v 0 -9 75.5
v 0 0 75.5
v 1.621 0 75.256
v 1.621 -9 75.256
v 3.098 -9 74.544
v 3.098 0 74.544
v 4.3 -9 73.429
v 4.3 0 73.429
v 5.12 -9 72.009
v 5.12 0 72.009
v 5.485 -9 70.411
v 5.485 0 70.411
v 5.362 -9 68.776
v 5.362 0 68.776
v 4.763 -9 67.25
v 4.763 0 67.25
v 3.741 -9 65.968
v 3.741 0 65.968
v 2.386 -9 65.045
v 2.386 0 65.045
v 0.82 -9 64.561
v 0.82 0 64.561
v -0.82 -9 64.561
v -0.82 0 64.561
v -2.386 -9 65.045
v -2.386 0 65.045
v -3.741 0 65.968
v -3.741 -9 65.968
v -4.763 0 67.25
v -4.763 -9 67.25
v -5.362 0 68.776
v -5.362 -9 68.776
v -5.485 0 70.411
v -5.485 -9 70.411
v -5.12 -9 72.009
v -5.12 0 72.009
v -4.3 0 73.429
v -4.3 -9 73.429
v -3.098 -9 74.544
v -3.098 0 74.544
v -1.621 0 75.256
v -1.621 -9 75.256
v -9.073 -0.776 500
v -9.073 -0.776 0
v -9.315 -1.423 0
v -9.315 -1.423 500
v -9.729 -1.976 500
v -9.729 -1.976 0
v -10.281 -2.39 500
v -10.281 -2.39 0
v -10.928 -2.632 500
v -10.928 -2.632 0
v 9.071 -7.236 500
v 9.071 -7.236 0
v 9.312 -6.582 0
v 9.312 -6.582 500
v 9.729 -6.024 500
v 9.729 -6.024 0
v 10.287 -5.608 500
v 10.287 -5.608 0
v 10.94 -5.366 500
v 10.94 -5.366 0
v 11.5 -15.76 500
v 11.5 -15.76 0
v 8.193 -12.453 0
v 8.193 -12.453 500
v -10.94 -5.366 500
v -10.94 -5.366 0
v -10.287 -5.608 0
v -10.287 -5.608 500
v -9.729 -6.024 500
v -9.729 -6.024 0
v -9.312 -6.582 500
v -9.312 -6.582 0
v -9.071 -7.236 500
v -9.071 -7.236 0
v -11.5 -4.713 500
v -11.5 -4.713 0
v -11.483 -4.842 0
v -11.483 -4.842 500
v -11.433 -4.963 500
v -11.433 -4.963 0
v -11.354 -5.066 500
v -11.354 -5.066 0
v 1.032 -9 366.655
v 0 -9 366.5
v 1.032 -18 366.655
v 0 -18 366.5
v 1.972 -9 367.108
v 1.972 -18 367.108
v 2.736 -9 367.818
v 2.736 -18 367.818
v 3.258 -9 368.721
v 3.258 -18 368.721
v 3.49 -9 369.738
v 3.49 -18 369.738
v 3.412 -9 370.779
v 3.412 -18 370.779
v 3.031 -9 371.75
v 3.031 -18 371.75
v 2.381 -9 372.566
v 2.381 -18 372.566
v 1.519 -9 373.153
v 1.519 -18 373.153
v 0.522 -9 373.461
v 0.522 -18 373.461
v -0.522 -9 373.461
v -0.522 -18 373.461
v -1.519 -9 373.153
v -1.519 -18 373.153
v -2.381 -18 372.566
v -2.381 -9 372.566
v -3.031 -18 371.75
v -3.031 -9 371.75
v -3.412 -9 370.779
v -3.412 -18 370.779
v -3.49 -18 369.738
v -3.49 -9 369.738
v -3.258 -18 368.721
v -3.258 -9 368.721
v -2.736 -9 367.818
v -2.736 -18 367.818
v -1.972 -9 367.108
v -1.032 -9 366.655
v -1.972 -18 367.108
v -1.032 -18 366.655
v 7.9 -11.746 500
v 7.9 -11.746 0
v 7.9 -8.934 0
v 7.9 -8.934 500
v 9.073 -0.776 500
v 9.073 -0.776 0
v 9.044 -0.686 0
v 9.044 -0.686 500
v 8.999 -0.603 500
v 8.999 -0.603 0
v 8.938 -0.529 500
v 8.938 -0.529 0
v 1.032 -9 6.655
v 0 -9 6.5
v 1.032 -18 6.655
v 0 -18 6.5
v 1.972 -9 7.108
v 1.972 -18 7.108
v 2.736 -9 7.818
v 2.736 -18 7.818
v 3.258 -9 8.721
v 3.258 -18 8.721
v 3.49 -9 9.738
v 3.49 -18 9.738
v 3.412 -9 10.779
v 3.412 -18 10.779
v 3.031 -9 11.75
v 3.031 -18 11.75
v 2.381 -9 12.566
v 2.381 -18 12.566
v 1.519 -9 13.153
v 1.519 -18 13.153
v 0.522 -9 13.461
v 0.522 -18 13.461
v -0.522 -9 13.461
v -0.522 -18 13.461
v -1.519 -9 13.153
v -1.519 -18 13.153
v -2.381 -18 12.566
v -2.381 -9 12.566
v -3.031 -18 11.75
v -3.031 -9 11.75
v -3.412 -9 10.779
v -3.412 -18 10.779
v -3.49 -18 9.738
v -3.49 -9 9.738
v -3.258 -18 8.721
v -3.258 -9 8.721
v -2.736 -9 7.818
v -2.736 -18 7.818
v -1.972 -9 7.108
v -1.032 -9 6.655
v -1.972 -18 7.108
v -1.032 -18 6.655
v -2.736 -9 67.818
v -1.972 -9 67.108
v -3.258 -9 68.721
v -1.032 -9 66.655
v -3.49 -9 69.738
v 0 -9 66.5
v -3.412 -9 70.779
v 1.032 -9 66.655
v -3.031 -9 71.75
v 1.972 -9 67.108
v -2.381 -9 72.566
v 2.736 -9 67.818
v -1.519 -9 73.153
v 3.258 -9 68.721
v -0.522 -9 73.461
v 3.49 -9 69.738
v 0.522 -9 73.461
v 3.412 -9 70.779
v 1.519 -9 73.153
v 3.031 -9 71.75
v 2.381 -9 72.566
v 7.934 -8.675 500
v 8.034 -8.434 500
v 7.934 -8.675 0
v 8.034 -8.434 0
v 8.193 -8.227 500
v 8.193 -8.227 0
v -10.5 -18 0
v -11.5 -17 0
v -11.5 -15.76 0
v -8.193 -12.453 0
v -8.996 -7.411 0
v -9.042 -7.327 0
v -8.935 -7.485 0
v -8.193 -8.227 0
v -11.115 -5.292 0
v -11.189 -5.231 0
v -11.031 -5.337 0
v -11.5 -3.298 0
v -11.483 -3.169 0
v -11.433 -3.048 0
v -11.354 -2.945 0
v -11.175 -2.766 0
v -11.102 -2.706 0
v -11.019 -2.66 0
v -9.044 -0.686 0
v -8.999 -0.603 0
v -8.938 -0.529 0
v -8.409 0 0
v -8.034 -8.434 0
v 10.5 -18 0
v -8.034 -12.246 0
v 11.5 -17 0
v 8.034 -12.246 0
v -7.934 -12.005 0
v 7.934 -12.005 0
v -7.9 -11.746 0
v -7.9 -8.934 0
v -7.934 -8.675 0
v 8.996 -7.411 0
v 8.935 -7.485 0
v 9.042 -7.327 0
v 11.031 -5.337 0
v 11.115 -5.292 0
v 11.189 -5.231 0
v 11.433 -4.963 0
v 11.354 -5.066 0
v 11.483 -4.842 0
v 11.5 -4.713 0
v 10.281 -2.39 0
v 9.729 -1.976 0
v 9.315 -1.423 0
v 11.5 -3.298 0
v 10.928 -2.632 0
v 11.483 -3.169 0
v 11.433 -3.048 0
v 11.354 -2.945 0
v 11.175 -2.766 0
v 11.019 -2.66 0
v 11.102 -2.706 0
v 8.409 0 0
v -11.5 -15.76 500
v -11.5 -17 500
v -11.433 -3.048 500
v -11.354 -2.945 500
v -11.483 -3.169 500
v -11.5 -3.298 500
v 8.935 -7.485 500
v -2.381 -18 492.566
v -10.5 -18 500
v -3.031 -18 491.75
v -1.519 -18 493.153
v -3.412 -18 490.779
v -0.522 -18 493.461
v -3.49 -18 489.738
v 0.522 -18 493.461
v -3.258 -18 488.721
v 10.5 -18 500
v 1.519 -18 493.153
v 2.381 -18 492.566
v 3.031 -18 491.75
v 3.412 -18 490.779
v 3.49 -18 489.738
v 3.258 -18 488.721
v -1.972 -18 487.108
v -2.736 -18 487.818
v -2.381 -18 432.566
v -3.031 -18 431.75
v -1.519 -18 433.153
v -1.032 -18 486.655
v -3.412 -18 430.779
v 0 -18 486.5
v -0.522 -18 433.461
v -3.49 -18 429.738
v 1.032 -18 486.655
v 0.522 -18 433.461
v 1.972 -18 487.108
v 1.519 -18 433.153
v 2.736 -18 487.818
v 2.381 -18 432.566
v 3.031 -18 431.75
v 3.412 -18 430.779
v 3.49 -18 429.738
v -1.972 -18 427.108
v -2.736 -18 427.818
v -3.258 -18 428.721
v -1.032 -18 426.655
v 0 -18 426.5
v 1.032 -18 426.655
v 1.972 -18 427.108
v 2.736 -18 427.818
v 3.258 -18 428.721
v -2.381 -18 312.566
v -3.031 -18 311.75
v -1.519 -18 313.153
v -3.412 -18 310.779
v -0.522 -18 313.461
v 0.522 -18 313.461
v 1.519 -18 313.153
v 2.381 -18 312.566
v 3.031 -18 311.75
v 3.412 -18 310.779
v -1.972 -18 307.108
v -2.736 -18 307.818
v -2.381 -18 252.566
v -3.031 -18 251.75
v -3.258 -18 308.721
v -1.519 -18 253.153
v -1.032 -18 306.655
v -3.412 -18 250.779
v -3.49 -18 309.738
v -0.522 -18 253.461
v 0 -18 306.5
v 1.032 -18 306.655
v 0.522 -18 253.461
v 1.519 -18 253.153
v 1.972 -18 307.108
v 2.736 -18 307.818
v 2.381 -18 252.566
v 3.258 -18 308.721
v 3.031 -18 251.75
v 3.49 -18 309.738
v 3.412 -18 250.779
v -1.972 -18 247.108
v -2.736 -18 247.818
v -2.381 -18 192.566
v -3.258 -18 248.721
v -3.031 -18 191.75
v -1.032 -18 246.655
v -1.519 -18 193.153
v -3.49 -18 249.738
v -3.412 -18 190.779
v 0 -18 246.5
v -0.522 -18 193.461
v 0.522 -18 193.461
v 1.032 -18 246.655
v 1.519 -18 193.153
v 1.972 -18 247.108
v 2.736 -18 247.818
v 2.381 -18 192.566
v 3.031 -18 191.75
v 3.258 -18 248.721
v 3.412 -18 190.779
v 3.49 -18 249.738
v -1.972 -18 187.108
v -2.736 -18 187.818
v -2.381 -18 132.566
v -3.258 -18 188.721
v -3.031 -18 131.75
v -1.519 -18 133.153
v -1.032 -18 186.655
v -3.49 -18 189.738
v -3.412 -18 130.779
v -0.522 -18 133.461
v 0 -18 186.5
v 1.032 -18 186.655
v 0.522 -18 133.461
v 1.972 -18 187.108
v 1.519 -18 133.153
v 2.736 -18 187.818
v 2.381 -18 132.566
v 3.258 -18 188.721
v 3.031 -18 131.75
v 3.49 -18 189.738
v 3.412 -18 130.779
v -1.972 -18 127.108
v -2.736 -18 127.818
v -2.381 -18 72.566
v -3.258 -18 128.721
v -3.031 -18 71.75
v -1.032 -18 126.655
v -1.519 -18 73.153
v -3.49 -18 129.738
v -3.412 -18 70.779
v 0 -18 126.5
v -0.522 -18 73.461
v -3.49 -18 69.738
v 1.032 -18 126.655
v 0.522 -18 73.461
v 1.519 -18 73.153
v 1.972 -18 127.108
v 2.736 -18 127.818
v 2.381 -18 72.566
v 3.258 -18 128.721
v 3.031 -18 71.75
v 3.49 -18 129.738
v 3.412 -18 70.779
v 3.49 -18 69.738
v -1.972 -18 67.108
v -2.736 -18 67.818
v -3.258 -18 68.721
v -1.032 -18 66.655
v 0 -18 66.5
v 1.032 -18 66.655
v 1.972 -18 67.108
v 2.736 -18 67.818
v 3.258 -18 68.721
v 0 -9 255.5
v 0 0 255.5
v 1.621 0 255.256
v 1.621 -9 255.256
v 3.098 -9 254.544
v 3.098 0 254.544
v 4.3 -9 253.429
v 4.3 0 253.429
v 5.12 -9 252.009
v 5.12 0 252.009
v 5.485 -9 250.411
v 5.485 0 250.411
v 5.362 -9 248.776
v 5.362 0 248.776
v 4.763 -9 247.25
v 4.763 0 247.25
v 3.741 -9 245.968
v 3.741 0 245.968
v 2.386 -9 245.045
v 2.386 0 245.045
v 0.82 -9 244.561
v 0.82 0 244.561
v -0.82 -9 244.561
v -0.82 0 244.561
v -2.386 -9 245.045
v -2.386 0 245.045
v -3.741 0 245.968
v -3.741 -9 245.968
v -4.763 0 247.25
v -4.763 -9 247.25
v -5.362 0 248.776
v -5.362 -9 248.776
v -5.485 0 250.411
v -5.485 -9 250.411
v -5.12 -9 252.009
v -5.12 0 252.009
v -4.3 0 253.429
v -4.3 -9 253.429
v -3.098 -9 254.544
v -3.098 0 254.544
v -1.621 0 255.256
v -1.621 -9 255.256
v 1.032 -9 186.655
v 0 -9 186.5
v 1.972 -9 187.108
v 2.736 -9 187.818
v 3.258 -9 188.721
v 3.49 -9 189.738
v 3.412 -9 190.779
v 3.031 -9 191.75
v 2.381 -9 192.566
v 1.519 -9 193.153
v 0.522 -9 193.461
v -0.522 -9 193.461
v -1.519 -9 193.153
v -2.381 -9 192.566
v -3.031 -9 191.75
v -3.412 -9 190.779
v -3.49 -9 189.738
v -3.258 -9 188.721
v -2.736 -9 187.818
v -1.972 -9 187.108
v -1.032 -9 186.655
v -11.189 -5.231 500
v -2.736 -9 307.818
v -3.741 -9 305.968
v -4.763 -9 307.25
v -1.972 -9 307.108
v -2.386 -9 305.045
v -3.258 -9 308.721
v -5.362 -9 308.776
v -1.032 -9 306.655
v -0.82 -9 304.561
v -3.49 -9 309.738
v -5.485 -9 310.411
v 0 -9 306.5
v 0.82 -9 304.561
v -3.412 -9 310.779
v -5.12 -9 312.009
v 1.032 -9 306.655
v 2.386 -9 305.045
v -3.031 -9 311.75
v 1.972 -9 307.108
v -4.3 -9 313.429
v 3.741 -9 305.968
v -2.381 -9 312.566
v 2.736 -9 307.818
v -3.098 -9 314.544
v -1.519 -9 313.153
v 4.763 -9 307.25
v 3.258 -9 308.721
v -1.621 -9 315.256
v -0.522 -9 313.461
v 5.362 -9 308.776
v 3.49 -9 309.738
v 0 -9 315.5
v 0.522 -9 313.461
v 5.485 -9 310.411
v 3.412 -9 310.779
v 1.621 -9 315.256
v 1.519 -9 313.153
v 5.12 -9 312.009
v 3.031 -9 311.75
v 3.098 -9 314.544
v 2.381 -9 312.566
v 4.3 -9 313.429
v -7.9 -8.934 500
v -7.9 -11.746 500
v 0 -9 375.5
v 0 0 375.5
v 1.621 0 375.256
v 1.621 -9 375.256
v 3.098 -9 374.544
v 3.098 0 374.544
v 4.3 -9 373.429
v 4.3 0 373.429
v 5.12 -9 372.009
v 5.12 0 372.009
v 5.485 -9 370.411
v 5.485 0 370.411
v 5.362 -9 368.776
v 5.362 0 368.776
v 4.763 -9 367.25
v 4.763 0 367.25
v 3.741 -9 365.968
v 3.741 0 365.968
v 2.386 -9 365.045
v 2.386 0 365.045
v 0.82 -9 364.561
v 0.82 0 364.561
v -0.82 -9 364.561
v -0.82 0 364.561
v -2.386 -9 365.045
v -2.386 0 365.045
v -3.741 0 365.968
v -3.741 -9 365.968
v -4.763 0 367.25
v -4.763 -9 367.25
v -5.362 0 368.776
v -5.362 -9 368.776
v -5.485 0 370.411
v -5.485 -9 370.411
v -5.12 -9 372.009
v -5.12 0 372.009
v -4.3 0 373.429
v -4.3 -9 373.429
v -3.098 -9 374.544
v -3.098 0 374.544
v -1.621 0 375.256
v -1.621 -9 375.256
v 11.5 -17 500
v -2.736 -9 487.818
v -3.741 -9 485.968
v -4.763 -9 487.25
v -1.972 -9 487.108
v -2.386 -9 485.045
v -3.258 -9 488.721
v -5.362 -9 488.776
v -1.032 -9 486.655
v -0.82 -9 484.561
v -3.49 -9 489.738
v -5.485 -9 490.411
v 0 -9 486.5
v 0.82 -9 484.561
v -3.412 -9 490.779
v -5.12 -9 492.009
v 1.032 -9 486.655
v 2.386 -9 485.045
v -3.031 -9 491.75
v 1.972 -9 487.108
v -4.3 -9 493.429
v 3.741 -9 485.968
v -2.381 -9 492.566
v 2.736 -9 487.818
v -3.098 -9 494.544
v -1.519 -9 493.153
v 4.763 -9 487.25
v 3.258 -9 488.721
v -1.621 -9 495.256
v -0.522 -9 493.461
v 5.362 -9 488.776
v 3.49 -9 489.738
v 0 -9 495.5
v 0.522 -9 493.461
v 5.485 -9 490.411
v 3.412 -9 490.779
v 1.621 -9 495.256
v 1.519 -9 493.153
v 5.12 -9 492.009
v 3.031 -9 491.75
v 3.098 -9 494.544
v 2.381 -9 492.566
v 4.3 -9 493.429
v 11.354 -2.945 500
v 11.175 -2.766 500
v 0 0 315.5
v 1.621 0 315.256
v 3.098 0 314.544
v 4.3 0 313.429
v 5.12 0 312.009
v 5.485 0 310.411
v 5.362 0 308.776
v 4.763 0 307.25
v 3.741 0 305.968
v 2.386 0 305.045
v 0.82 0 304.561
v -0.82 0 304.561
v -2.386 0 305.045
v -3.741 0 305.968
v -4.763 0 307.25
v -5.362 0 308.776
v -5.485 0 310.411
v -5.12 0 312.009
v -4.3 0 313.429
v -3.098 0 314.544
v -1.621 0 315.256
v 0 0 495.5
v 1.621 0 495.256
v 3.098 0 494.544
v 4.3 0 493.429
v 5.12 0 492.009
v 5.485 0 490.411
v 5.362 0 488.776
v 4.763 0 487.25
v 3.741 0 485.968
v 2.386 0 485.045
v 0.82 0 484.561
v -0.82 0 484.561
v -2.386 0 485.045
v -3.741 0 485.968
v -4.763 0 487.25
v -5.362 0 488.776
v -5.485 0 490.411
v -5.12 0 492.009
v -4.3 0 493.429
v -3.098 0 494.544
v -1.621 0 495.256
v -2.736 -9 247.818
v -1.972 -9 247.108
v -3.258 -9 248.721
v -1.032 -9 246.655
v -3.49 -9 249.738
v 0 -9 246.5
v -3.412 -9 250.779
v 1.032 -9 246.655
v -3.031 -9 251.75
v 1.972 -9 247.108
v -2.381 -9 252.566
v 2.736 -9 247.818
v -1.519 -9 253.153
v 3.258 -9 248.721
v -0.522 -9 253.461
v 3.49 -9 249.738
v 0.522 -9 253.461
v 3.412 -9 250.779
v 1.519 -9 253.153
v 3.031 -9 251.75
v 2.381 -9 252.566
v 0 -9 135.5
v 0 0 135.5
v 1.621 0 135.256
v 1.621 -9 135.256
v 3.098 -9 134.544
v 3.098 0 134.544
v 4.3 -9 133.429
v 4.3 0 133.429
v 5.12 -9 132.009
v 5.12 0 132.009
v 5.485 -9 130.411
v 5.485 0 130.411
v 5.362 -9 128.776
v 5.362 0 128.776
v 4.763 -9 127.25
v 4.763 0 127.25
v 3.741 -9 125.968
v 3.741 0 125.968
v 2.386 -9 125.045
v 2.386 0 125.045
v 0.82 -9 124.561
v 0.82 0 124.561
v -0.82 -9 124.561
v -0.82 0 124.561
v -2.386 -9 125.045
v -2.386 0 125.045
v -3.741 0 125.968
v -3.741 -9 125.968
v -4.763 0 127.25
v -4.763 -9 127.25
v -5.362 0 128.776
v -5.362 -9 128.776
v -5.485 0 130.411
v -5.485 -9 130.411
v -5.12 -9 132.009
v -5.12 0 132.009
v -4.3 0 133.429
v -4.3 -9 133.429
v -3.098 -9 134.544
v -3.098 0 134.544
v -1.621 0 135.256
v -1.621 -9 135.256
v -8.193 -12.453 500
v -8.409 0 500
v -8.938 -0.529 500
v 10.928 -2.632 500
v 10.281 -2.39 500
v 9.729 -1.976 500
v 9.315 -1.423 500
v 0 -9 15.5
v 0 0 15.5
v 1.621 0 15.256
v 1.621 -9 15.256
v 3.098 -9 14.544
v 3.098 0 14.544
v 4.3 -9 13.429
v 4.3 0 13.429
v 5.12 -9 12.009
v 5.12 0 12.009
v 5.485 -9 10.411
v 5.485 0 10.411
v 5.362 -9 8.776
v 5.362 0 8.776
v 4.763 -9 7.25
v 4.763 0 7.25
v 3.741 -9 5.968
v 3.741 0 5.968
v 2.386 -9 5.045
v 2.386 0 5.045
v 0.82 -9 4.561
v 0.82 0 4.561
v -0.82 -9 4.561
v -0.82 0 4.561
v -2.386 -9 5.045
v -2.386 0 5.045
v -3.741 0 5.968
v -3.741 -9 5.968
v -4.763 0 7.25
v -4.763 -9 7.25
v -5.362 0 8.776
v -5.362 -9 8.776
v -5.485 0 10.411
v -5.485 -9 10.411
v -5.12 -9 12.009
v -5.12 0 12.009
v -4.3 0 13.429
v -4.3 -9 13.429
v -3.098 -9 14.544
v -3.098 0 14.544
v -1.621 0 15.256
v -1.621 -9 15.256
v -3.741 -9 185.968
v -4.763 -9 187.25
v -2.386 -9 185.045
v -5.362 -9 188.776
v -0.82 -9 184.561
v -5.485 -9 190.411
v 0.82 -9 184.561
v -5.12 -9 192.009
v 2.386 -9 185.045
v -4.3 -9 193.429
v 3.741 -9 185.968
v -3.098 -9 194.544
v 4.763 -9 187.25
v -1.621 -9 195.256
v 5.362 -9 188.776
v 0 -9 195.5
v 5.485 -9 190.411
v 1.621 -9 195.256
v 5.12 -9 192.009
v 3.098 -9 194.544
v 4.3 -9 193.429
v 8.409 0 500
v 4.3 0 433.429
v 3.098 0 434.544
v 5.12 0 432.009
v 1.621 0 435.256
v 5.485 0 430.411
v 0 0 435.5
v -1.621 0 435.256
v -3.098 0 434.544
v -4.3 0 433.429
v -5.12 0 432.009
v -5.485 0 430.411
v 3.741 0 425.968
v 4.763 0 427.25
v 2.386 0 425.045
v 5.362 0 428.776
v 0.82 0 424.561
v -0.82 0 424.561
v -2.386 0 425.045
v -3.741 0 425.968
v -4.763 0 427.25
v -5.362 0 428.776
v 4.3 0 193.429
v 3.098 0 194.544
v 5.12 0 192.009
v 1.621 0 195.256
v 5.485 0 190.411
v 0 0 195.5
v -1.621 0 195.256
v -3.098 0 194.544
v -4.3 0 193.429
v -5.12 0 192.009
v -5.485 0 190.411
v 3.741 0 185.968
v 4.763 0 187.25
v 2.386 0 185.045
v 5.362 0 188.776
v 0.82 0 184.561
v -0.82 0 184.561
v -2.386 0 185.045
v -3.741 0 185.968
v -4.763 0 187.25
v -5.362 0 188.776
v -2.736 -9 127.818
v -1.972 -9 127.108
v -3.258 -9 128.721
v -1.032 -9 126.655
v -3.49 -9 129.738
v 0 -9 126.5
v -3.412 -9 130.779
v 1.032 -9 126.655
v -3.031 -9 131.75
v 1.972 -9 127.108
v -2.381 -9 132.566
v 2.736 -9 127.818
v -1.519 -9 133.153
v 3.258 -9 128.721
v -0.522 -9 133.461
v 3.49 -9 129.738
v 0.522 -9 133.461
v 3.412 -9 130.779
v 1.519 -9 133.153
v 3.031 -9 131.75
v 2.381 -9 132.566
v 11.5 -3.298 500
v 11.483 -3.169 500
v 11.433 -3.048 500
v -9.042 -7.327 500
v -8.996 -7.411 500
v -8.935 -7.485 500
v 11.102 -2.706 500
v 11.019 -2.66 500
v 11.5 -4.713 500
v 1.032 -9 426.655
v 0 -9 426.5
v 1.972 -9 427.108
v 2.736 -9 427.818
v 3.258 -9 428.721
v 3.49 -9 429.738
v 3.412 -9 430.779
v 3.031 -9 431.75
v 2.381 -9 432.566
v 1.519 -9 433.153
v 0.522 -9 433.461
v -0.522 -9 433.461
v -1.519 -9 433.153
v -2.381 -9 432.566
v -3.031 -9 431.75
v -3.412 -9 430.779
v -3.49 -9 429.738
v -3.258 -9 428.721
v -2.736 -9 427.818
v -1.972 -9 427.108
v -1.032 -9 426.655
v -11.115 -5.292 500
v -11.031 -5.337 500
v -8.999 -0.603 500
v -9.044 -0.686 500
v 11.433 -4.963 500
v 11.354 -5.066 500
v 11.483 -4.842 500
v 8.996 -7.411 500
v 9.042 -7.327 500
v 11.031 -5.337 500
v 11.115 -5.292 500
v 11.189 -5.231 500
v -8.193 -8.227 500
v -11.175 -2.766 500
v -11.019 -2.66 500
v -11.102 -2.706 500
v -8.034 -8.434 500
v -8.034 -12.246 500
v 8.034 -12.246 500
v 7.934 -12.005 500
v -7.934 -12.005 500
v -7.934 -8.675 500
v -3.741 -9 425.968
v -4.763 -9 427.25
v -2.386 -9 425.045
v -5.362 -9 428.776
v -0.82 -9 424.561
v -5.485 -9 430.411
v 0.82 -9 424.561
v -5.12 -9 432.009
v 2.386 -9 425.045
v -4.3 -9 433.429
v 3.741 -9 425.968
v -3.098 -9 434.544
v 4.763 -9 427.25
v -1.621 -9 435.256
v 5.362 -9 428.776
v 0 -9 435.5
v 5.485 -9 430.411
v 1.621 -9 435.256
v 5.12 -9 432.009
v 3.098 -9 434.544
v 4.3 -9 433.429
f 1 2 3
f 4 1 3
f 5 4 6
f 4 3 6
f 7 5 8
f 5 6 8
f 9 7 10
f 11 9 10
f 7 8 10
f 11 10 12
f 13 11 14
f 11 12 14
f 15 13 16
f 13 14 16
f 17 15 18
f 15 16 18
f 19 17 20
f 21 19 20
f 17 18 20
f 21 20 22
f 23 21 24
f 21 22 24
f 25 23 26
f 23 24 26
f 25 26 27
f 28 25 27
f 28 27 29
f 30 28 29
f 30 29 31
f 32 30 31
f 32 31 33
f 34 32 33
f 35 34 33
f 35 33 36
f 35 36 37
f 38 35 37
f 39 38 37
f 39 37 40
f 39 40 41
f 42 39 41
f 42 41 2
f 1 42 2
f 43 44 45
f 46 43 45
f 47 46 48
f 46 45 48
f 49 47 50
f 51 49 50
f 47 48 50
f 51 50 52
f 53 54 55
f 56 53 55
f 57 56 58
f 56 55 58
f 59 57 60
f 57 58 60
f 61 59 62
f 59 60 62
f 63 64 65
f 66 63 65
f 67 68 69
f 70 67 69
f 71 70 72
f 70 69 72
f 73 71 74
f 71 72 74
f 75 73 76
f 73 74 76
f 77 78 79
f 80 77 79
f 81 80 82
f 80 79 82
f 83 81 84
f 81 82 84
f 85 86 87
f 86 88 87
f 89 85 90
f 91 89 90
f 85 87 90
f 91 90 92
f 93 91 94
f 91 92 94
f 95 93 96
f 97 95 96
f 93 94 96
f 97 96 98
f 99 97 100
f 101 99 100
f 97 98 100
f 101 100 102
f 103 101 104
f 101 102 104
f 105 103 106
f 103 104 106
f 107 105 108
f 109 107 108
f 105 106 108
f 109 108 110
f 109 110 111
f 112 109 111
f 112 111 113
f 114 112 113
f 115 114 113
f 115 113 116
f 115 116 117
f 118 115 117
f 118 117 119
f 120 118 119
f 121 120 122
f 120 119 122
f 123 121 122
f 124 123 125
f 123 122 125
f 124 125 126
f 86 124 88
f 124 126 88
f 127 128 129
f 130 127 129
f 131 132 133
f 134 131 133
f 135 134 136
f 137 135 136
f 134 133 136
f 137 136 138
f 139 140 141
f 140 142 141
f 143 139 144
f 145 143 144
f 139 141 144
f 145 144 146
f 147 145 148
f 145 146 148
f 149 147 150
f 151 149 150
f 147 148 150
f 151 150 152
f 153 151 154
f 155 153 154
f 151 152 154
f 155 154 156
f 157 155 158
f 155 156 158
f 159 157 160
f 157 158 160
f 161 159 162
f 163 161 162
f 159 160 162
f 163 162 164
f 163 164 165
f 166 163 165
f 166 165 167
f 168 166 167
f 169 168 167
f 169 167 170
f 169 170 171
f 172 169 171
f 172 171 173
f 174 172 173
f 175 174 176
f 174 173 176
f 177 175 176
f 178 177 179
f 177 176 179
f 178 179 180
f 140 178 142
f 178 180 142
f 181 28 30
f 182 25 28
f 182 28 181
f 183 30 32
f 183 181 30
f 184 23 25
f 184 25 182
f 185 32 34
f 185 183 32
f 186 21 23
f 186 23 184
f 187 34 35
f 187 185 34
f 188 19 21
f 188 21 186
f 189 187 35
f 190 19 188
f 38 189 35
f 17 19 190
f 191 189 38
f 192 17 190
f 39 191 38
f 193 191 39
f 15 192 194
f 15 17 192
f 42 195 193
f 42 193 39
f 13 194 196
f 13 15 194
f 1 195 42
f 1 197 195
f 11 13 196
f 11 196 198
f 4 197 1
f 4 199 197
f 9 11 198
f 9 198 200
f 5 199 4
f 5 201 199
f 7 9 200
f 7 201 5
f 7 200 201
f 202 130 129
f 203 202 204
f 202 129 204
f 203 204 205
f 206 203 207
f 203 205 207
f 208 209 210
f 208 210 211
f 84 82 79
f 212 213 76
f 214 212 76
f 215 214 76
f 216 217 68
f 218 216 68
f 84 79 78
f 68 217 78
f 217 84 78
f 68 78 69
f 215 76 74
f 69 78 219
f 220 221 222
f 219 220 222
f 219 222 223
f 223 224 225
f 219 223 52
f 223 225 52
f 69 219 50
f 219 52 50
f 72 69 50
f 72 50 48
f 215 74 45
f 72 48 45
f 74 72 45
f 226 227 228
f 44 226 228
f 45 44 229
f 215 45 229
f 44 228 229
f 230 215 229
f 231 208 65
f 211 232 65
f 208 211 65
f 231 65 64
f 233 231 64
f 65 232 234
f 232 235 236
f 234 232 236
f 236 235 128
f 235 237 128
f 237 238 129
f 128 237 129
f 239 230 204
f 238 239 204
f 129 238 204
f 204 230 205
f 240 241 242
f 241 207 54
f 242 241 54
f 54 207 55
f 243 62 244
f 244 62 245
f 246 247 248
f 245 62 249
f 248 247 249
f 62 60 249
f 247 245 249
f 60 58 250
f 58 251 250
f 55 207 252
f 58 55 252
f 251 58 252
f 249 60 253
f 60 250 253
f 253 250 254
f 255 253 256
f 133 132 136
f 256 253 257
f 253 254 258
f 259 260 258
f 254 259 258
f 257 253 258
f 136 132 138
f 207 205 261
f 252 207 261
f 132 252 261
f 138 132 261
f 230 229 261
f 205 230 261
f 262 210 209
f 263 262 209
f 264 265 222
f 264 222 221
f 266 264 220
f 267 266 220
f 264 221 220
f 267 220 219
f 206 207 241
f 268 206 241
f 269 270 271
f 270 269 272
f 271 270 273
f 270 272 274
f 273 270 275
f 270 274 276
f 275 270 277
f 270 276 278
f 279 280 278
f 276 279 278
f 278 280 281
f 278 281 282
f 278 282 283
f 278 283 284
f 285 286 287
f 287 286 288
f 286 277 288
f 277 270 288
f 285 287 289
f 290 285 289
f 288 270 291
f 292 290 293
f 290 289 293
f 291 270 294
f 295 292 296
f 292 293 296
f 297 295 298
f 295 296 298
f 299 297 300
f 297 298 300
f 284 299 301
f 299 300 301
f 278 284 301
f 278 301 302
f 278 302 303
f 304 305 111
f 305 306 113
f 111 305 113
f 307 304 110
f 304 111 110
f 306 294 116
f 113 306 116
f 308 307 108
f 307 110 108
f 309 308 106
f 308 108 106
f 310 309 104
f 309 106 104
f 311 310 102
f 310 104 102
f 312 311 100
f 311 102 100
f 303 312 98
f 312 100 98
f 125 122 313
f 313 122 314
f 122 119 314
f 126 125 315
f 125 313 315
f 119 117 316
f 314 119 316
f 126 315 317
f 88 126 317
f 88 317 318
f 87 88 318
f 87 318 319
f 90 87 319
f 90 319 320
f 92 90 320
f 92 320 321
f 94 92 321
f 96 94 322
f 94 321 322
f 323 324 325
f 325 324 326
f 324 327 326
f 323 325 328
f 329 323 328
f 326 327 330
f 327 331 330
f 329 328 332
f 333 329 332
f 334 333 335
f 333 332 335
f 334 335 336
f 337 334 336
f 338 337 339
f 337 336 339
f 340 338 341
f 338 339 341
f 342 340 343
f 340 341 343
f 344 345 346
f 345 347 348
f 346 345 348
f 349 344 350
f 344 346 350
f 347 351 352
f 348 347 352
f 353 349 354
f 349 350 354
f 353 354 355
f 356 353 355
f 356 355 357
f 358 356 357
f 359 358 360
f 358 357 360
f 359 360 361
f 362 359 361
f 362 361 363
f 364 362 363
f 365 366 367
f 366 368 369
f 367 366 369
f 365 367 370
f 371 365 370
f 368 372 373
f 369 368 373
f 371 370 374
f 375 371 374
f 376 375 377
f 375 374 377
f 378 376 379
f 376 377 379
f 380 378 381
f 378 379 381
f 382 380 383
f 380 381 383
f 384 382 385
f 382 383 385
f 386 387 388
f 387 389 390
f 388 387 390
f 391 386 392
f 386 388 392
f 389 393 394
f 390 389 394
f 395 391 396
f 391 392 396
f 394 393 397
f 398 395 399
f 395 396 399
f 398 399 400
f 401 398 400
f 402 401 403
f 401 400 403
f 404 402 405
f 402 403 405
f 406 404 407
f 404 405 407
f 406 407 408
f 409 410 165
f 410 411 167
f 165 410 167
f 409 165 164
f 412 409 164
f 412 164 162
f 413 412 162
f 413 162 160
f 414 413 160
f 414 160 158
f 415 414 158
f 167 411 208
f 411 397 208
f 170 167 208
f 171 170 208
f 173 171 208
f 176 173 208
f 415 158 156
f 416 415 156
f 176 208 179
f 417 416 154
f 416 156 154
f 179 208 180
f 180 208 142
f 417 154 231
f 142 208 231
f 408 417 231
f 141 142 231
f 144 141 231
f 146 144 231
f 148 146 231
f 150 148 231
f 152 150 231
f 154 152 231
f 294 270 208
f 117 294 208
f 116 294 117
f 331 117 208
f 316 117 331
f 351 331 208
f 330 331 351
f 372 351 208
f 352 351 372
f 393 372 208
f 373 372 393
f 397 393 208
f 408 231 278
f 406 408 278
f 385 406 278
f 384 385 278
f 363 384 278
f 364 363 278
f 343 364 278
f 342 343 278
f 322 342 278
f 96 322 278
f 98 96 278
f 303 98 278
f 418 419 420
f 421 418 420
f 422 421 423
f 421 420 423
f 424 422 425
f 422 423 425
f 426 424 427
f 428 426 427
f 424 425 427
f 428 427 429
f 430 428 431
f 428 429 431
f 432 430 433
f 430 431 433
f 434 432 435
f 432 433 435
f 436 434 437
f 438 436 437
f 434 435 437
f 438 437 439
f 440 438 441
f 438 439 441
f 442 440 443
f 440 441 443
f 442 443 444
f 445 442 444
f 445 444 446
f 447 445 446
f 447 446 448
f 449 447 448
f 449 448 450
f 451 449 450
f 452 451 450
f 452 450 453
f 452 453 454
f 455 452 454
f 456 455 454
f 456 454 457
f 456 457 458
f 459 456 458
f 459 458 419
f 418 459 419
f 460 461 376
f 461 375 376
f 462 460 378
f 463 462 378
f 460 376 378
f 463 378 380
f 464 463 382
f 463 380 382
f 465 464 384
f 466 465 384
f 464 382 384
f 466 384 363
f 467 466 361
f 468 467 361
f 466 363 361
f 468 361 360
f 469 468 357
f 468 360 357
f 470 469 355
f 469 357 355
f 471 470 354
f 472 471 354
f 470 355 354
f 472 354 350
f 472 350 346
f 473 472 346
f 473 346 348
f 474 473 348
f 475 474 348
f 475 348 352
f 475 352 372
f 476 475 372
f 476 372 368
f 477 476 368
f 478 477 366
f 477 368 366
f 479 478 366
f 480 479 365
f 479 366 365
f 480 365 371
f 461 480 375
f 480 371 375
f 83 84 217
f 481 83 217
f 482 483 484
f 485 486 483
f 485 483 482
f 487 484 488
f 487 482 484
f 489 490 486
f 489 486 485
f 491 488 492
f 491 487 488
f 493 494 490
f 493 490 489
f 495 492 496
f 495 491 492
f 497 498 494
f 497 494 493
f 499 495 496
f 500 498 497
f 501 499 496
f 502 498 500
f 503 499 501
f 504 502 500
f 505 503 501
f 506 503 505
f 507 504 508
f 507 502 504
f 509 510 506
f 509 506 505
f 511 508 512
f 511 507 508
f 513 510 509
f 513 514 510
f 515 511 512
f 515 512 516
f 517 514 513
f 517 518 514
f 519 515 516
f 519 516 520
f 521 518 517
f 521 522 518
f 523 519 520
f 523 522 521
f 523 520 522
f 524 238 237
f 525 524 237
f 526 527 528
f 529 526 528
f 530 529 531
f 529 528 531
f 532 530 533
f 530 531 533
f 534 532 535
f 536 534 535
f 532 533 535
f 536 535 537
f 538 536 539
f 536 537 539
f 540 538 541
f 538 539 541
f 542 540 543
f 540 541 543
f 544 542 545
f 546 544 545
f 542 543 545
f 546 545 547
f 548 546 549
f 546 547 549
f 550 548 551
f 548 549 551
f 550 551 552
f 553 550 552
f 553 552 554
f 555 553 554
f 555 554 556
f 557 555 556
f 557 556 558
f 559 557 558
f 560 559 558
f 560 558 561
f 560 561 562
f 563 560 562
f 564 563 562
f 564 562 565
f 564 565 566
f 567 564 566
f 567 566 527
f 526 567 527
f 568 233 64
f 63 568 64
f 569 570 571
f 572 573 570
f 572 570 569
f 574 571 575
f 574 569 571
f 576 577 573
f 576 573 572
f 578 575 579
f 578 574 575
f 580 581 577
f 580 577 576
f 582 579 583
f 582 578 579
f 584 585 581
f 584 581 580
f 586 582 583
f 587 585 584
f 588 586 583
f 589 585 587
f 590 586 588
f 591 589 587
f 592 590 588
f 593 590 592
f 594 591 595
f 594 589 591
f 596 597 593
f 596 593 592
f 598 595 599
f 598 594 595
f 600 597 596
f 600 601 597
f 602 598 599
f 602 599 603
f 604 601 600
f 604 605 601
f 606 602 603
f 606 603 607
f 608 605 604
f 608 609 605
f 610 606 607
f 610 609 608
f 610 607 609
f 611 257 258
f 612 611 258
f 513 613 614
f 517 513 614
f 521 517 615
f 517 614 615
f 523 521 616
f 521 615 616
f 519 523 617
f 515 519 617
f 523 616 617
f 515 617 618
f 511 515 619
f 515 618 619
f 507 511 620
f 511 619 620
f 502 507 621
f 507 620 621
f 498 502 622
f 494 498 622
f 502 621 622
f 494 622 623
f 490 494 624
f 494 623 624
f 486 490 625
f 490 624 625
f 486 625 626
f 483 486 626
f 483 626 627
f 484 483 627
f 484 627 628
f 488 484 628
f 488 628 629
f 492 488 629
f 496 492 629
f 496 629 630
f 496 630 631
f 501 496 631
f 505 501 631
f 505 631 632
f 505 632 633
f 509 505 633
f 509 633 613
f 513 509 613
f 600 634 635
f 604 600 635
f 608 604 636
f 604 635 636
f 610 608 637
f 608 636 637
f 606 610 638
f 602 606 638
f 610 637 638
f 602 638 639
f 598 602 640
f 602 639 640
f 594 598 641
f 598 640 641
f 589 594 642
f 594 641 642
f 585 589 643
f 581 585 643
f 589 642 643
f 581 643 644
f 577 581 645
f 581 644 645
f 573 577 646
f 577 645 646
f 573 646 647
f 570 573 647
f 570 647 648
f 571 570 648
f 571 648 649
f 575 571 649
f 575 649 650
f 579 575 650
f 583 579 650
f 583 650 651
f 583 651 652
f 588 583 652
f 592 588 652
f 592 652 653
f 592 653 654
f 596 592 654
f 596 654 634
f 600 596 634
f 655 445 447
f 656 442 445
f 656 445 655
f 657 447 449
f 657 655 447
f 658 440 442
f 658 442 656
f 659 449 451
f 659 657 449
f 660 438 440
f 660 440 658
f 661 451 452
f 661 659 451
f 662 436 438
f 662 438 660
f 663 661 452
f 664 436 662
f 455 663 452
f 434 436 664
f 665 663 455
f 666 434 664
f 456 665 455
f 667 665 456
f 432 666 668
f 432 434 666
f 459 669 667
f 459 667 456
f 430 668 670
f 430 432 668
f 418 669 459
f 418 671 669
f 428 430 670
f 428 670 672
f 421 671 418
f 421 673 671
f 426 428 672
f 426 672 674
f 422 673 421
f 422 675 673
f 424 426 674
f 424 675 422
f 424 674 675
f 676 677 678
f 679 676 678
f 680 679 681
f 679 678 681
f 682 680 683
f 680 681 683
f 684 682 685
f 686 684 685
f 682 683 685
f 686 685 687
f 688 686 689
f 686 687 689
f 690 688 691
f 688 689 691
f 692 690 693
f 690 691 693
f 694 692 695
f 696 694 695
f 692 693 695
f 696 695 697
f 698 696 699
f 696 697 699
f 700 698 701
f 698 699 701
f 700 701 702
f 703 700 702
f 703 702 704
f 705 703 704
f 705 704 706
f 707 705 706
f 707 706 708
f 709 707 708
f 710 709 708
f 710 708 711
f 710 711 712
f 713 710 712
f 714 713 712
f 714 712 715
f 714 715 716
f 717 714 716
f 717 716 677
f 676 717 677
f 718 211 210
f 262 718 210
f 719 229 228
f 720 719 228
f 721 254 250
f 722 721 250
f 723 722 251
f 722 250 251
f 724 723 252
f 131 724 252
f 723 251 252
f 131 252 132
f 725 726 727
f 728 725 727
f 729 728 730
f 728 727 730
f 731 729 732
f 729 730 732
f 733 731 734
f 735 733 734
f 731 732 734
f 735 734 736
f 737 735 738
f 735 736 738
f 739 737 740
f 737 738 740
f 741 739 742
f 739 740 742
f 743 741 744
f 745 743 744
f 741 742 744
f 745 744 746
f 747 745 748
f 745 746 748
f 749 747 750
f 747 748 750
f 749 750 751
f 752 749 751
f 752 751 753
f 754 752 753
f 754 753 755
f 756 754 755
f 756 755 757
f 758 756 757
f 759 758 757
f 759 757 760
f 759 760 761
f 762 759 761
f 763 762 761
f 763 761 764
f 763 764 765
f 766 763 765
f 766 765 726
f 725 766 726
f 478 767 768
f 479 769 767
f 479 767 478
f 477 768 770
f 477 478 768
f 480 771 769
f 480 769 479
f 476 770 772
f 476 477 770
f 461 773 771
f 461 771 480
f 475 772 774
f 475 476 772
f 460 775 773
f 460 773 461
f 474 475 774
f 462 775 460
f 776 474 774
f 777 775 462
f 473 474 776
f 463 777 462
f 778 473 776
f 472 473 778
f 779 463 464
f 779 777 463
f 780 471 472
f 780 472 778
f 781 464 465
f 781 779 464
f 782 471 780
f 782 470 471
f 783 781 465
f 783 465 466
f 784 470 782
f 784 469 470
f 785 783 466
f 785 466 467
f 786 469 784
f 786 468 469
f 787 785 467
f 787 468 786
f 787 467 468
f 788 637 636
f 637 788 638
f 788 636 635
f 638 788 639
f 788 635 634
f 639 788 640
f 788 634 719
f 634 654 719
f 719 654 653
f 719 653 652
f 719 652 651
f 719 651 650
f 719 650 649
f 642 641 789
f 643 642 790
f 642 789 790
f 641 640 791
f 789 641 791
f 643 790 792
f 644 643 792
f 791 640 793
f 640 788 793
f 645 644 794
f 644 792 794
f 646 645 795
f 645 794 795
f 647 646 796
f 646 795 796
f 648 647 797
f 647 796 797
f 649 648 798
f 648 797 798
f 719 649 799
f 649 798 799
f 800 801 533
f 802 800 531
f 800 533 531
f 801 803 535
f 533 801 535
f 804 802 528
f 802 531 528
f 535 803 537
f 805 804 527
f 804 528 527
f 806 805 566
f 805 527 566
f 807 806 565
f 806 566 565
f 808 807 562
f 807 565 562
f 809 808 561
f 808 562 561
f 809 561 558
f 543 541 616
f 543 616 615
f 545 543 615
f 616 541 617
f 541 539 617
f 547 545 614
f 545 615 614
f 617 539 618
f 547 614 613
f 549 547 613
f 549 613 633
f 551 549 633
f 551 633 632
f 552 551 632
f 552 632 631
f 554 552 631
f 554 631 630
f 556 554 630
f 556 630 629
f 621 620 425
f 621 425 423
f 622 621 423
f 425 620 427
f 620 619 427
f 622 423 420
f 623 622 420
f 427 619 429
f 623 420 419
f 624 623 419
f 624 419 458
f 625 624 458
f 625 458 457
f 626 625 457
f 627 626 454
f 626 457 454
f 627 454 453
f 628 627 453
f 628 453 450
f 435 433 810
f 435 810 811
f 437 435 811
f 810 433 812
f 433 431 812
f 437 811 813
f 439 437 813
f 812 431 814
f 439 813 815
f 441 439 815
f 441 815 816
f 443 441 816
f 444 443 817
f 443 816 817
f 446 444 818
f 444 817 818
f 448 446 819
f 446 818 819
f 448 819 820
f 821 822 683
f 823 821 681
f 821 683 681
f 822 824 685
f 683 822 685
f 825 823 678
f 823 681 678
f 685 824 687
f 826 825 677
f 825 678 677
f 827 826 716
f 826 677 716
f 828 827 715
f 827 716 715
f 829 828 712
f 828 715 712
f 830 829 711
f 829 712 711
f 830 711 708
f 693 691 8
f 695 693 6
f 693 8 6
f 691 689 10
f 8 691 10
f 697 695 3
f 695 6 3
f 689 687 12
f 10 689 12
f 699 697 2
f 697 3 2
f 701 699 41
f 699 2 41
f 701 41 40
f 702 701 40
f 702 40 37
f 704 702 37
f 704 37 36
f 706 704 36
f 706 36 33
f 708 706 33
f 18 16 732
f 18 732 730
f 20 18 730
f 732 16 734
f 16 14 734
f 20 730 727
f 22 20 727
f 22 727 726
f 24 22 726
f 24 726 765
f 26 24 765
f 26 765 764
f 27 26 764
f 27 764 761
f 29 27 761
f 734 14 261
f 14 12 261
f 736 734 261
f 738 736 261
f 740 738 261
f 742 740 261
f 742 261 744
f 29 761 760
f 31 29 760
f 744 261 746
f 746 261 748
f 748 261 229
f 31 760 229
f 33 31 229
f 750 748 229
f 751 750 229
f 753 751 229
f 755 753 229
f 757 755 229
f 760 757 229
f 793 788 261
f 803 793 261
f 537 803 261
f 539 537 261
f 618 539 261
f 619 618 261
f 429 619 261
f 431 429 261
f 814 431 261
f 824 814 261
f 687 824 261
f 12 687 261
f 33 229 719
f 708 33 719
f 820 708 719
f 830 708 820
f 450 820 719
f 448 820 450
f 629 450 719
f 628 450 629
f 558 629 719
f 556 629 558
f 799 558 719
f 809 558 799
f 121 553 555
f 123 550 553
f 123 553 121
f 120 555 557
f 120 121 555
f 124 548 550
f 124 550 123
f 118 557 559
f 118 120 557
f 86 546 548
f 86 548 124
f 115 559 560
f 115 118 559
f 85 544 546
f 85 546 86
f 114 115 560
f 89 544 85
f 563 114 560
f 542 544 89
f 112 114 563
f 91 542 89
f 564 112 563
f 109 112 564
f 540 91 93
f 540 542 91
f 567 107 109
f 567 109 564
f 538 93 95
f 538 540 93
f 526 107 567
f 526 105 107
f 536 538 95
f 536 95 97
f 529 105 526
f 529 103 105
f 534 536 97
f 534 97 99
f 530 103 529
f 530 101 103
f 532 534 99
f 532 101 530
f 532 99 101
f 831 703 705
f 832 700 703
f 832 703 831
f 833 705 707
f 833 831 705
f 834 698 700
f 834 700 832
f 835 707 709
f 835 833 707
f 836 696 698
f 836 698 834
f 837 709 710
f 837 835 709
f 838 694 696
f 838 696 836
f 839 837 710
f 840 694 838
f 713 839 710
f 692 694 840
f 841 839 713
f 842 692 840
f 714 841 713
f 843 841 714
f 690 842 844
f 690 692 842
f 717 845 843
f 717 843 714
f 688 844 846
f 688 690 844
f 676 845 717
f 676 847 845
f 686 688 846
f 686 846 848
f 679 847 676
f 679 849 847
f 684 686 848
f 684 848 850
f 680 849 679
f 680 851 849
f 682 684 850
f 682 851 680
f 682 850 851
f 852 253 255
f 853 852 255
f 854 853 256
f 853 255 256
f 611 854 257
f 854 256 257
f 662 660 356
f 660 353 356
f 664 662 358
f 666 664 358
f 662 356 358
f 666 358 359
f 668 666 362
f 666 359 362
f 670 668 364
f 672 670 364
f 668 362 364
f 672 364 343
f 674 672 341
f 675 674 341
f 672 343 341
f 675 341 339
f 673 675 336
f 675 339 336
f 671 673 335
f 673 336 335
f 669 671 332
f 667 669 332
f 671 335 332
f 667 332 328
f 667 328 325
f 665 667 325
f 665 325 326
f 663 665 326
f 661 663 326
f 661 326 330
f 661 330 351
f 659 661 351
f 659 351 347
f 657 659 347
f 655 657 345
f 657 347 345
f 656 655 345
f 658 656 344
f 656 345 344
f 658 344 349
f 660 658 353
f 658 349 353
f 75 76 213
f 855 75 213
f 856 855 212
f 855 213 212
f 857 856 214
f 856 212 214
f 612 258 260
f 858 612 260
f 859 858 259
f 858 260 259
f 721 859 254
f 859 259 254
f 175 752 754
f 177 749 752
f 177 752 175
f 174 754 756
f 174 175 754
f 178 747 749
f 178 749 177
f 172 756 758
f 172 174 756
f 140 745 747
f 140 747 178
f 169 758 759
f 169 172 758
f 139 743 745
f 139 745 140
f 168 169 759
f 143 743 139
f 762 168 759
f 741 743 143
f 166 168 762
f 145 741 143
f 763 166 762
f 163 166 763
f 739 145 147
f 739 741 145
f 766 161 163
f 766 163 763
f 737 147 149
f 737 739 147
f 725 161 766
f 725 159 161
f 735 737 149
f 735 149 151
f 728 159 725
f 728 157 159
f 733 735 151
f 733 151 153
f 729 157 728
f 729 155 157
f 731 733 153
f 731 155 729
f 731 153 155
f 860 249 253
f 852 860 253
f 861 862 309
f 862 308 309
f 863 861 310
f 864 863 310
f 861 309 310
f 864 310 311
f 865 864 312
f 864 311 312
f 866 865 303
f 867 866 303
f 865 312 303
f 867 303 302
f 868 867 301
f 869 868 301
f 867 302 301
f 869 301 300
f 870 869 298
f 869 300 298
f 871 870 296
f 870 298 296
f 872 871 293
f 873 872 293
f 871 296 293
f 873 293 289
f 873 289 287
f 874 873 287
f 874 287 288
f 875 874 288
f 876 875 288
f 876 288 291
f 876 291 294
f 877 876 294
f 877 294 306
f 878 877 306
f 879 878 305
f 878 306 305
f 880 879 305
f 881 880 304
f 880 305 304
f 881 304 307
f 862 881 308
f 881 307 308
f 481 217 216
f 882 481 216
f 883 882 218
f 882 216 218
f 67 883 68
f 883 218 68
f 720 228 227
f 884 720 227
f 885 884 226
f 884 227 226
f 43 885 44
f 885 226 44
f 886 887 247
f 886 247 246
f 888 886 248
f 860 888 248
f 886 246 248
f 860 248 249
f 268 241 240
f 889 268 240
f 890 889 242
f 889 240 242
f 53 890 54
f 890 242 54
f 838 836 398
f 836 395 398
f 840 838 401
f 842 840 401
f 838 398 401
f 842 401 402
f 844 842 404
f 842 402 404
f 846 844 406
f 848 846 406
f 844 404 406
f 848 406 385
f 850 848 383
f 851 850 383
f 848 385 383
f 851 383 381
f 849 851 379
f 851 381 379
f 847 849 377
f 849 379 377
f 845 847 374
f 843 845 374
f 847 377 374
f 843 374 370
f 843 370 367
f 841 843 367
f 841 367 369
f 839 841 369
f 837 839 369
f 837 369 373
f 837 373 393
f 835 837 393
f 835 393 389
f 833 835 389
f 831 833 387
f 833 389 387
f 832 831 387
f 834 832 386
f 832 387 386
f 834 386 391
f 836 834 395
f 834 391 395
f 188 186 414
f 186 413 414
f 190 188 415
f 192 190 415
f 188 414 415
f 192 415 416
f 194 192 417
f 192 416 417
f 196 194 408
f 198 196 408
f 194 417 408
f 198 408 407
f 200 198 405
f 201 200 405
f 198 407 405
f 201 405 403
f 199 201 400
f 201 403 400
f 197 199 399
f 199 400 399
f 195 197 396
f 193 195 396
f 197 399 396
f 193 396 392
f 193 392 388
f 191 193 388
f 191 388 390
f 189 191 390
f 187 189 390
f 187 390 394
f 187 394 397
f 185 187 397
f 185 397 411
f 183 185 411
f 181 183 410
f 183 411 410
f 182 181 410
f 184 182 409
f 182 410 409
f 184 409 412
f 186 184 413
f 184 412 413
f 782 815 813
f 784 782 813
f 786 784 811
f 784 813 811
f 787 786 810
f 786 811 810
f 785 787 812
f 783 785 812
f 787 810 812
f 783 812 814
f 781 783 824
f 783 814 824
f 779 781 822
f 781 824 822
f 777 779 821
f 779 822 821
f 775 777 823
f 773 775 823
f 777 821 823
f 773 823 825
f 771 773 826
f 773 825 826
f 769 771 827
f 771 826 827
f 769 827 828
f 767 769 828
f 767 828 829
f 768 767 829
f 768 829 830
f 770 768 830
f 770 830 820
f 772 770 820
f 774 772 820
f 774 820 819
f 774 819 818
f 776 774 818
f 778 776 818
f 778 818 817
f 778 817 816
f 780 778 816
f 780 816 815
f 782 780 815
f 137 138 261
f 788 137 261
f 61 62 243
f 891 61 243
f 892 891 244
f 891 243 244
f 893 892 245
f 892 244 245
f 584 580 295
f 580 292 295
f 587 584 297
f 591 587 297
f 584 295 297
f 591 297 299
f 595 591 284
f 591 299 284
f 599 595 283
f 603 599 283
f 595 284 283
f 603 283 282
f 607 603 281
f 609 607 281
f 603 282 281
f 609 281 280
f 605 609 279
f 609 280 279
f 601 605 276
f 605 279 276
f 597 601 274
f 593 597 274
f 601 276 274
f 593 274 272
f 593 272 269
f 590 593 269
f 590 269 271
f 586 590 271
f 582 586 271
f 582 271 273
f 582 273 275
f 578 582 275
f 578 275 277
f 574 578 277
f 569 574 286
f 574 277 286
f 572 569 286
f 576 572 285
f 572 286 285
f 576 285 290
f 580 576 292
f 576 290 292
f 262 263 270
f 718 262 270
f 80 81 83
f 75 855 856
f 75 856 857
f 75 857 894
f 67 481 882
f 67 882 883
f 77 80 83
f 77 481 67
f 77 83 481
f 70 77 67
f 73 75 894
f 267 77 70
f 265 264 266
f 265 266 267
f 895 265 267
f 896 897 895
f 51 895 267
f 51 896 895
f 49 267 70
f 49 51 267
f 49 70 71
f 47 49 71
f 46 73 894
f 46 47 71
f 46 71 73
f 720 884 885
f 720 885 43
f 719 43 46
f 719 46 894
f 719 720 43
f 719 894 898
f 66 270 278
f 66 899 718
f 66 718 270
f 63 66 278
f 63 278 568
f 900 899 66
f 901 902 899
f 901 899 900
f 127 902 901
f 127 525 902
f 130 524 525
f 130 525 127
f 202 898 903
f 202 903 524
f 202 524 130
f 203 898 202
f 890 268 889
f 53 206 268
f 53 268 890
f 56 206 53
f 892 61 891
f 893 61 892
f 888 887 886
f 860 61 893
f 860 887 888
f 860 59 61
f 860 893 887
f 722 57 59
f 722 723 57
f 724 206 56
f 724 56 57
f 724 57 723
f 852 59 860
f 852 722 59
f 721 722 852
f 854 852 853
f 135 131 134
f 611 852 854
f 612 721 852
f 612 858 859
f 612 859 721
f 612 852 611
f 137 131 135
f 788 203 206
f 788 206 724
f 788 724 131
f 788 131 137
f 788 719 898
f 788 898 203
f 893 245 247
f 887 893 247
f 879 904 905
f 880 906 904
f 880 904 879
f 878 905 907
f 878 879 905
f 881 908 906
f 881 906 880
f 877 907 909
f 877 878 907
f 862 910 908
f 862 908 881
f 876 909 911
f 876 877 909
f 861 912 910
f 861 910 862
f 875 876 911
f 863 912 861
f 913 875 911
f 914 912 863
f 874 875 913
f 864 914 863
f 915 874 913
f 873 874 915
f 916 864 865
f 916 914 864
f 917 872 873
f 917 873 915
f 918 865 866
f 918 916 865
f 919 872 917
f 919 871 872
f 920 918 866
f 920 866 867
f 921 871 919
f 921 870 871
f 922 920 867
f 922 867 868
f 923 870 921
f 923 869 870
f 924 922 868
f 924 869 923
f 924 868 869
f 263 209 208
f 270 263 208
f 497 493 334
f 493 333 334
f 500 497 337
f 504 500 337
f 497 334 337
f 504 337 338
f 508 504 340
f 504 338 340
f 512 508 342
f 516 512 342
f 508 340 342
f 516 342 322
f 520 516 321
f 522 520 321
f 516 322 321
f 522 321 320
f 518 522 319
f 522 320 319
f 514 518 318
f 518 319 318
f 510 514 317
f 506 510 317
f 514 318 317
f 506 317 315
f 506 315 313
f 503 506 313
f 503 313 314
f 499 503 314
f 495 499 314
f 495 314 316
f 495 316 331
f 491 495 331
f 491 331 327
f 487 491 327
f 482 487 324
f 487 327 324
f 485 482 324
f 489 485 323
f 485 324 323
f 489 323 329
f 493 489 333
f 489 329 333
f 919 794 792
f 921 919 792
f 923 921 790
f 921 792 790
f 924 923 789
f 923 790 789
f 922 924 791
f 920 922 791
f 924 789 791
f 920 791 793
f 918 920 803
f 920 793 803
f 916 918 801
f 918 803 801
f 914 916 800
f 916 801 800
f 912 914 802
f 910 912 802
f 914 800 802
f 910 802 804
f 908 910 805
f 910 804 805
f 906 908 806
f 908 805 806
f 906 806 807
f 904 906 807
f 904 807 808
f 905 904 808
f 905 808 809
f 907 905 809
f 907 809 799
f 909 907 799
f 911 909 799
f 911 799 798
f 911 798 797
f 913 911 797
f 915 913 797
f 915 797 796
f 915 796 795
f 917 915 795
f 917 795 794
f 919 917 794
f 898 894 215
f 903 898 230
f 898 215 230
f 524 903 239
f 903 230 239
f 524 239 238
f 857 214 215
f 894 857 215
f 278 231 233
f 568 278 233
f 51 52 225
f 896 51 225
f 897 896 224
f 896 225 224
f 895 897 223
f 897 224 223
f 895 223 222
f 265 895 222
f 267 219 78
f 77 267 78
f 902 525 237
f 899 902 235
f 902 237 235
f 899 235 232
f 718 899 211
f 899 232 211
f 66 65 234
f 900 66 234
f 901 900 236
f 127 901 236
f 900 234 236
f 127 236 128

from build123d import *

# Parameters (mm, degrees)
BOSS_EXTRUDE1_DEPTH                                 = 500
CBORE_FOR_M6_HEX_SOCKET_HEAD_CAP_SCREW1_D           = 7
CBORE_FOR_M6_HEX_SOCKET_HEAD_CAP_SCREW1_CBORE_D     = 11
CBORE_FOR_M6_HEX_SOCKET_HEAD_CAP_SCREW1_CBORE_DEPTH = 9
LPATTERN1_COUNT                                     = 9
LPATTERN1_PITCH                                     = 60


with BuildPart() as part:
    # Sketch1 → Boss-Extrude1 (new body)
    with BuildSketch(Plane.XY):
        with BuildLine():
            Line((-8.192893219, -12.452822372), (-11.5, -15.759929153))
            Line((-11.5, -15.759929153), (-11.5, -17))
            Line((-11.5, -17), (-10.5, -18))
            Line((-10.5, -18), (10.5, -18))
            Line((10.5, -18), (11.5, -17))
            Line((11.5, -17), (11.5, -15.759929153))
            Line((11.5, -15.759929153), (8.192893219, -12.452822372))
            ThreePointArc((8.192893219, -12.452822372), (7.976120468, -12.128399023), (7.9, -11.745715591))
            Line((7.9, -11.745715591), (7.9, -8.934076562))
            ThreePointArc((7.9, -8.934076562), (7.976120468, -8.55139313), (8.192893219, -8.226969781))
            Line((8.192893219, -8.226969781), (8.93515621, -7.48470679))
            ThreePointArc((8.93515621, -7.48470679), (9.020912002, -7.369915712), (9.070589884, -7.235516473))
            ThreePointArc((9.070589884, -7.235516473), (9.728797536, -6.024451536), (10.939862473, -5.366243884))
            ThreePointArc((10.939862473, -5.366243884), (11.074261712, -5.316566002), (11.18905279, -5.23081021))
            Line((11.18905279, -5.23081021), (11.353553391, -5.066309609))
            ThreePointArc((11.353553391, -5.066309609), (11.461939766, -4.904097935), (11.5, -4.712756219))
            Line((11.5, -4.712756219), (11.5, -3.298408781))
            ThreePointArc((11.5, -3.298408781), (11.461939766, -3.107067065), (11.353553391, -2.944855391))
            Line((11.353553391, -2.944855391), (11.175123458, -2.766425458))
            ThreePointArc((11.175123458, -2.766425458), (11.061399997, -2.681251593), (10.928310161, -2.631505152))
            ThreePointArc((10.928310161, -2.631505152), (9.728797536, -1.975792464), (9.073084848, -0.776279839))
            ThreePointArc((9.073084848, -0.776279839), (9.023338407, -0.643190003), (8.938164542, -0.529466542))
            Line((8.938164542, -0.529466542), (8.408698, 0))
            Line((8.408698, 0), (-8.408698, 0))
            Line((-8.408698, 0), (-8.938164542, -0.529466542))
            ThreePointArc((-8.938164542, -0.529466542), (-9.023338407, -0.643190003), (-9.073084848, -0.776279839))
            ThreePointArc((-9.073084848, -0.776279839), (-9.728797536, -1.975792464), (-10.928310161, -2.631505152))
            ThreePointArc((-10.928310161, -2.631505152), (-11.061399997, -2.681251593), (-11.175123458, -2.766425458))
            Line((-11.175123458, -2.766425458), (-11.353553391, -2.944855391))
            ThreePointArc((-11.353553391, -2.944855391), (-11.461939766, -3.107067065), (-11.5, -3.298408781))
            Line((-11.5, -3.298408781), (-11.5, -4.712756219))
            ThreePointArc((-11.5, -4.712756219), (-11.461939766, -4.904097935), (-11.353553391, -5.066309609))
            Line((-11.353553391, -5.066309609), (-11.18905279, -5.23081021))
            ThreePointArc((-11.18905279, -5.23081021), (-11.074261712, -5.316566002), (-10.939862473, -5.366243884))
            ThreePointArc((-10.939862473, -5.366243884), (-9.728797536, -6.024451536), (-9.070589884, -7.235516473))
            ThreePointArc((-9.070589884, -7.235516473), (-9.020912002, -7.369915712), (-8.93515621, -7.48470679))
            Line((-8.93515621, -7.48470679), (-8.192893219, -8.226969781))
            ThreePointArc((-8.192893219, -8.226969781), (-7.976120468, -8.55139313), (-7.9, -8.934076562))
            Line((-7.9, -8.934076562), (-7.9, -11.745715591))
            ThreePointArc((-7.9, -11.745715591), (-7.976120468, -12.128399023), (-8.192893219, -12.452822372))
        make_face()
    extrude(amount=BOSS_EXTRUDE1_DEPTH)

    # CBORE for M6 Hex Socket Head Cap Screw1 (through all)
    with Locations(Plane(origin=(0, 0, 10), x_dir=(0, 0, 1), z_dir=(0, 1, 0))):
        with Locations((0, 0)):
            cbore_for_m6_hex_socket_head_cap_screw1 = CounterBoreHole(CBORE_FOR_M6_HEX_SOCKET_HEAD_CAP_SCREW1_D / 2, CBORE_FOR_M6_HEX_SOCKET_HEAD_CAP_SCREW1_CBORE_D / 2, CBORE_FOR_M6_HEX_SOCKET_HEAD_CAP_SCREW1_CBORE_DEPTH)

    # LPattern1: CBORE for M6 Hex Socket Head Cap Screw1 ×9
    with Locations(*[(0, 0, i * LPATTERN1_PITCH) for i in range(1, LPATTERN1_COUNT)]):
        add(cbore_for_m6_hex_socket_head_cap_screw1, mode=Mode.SUBTRACT)


solid = part.part
